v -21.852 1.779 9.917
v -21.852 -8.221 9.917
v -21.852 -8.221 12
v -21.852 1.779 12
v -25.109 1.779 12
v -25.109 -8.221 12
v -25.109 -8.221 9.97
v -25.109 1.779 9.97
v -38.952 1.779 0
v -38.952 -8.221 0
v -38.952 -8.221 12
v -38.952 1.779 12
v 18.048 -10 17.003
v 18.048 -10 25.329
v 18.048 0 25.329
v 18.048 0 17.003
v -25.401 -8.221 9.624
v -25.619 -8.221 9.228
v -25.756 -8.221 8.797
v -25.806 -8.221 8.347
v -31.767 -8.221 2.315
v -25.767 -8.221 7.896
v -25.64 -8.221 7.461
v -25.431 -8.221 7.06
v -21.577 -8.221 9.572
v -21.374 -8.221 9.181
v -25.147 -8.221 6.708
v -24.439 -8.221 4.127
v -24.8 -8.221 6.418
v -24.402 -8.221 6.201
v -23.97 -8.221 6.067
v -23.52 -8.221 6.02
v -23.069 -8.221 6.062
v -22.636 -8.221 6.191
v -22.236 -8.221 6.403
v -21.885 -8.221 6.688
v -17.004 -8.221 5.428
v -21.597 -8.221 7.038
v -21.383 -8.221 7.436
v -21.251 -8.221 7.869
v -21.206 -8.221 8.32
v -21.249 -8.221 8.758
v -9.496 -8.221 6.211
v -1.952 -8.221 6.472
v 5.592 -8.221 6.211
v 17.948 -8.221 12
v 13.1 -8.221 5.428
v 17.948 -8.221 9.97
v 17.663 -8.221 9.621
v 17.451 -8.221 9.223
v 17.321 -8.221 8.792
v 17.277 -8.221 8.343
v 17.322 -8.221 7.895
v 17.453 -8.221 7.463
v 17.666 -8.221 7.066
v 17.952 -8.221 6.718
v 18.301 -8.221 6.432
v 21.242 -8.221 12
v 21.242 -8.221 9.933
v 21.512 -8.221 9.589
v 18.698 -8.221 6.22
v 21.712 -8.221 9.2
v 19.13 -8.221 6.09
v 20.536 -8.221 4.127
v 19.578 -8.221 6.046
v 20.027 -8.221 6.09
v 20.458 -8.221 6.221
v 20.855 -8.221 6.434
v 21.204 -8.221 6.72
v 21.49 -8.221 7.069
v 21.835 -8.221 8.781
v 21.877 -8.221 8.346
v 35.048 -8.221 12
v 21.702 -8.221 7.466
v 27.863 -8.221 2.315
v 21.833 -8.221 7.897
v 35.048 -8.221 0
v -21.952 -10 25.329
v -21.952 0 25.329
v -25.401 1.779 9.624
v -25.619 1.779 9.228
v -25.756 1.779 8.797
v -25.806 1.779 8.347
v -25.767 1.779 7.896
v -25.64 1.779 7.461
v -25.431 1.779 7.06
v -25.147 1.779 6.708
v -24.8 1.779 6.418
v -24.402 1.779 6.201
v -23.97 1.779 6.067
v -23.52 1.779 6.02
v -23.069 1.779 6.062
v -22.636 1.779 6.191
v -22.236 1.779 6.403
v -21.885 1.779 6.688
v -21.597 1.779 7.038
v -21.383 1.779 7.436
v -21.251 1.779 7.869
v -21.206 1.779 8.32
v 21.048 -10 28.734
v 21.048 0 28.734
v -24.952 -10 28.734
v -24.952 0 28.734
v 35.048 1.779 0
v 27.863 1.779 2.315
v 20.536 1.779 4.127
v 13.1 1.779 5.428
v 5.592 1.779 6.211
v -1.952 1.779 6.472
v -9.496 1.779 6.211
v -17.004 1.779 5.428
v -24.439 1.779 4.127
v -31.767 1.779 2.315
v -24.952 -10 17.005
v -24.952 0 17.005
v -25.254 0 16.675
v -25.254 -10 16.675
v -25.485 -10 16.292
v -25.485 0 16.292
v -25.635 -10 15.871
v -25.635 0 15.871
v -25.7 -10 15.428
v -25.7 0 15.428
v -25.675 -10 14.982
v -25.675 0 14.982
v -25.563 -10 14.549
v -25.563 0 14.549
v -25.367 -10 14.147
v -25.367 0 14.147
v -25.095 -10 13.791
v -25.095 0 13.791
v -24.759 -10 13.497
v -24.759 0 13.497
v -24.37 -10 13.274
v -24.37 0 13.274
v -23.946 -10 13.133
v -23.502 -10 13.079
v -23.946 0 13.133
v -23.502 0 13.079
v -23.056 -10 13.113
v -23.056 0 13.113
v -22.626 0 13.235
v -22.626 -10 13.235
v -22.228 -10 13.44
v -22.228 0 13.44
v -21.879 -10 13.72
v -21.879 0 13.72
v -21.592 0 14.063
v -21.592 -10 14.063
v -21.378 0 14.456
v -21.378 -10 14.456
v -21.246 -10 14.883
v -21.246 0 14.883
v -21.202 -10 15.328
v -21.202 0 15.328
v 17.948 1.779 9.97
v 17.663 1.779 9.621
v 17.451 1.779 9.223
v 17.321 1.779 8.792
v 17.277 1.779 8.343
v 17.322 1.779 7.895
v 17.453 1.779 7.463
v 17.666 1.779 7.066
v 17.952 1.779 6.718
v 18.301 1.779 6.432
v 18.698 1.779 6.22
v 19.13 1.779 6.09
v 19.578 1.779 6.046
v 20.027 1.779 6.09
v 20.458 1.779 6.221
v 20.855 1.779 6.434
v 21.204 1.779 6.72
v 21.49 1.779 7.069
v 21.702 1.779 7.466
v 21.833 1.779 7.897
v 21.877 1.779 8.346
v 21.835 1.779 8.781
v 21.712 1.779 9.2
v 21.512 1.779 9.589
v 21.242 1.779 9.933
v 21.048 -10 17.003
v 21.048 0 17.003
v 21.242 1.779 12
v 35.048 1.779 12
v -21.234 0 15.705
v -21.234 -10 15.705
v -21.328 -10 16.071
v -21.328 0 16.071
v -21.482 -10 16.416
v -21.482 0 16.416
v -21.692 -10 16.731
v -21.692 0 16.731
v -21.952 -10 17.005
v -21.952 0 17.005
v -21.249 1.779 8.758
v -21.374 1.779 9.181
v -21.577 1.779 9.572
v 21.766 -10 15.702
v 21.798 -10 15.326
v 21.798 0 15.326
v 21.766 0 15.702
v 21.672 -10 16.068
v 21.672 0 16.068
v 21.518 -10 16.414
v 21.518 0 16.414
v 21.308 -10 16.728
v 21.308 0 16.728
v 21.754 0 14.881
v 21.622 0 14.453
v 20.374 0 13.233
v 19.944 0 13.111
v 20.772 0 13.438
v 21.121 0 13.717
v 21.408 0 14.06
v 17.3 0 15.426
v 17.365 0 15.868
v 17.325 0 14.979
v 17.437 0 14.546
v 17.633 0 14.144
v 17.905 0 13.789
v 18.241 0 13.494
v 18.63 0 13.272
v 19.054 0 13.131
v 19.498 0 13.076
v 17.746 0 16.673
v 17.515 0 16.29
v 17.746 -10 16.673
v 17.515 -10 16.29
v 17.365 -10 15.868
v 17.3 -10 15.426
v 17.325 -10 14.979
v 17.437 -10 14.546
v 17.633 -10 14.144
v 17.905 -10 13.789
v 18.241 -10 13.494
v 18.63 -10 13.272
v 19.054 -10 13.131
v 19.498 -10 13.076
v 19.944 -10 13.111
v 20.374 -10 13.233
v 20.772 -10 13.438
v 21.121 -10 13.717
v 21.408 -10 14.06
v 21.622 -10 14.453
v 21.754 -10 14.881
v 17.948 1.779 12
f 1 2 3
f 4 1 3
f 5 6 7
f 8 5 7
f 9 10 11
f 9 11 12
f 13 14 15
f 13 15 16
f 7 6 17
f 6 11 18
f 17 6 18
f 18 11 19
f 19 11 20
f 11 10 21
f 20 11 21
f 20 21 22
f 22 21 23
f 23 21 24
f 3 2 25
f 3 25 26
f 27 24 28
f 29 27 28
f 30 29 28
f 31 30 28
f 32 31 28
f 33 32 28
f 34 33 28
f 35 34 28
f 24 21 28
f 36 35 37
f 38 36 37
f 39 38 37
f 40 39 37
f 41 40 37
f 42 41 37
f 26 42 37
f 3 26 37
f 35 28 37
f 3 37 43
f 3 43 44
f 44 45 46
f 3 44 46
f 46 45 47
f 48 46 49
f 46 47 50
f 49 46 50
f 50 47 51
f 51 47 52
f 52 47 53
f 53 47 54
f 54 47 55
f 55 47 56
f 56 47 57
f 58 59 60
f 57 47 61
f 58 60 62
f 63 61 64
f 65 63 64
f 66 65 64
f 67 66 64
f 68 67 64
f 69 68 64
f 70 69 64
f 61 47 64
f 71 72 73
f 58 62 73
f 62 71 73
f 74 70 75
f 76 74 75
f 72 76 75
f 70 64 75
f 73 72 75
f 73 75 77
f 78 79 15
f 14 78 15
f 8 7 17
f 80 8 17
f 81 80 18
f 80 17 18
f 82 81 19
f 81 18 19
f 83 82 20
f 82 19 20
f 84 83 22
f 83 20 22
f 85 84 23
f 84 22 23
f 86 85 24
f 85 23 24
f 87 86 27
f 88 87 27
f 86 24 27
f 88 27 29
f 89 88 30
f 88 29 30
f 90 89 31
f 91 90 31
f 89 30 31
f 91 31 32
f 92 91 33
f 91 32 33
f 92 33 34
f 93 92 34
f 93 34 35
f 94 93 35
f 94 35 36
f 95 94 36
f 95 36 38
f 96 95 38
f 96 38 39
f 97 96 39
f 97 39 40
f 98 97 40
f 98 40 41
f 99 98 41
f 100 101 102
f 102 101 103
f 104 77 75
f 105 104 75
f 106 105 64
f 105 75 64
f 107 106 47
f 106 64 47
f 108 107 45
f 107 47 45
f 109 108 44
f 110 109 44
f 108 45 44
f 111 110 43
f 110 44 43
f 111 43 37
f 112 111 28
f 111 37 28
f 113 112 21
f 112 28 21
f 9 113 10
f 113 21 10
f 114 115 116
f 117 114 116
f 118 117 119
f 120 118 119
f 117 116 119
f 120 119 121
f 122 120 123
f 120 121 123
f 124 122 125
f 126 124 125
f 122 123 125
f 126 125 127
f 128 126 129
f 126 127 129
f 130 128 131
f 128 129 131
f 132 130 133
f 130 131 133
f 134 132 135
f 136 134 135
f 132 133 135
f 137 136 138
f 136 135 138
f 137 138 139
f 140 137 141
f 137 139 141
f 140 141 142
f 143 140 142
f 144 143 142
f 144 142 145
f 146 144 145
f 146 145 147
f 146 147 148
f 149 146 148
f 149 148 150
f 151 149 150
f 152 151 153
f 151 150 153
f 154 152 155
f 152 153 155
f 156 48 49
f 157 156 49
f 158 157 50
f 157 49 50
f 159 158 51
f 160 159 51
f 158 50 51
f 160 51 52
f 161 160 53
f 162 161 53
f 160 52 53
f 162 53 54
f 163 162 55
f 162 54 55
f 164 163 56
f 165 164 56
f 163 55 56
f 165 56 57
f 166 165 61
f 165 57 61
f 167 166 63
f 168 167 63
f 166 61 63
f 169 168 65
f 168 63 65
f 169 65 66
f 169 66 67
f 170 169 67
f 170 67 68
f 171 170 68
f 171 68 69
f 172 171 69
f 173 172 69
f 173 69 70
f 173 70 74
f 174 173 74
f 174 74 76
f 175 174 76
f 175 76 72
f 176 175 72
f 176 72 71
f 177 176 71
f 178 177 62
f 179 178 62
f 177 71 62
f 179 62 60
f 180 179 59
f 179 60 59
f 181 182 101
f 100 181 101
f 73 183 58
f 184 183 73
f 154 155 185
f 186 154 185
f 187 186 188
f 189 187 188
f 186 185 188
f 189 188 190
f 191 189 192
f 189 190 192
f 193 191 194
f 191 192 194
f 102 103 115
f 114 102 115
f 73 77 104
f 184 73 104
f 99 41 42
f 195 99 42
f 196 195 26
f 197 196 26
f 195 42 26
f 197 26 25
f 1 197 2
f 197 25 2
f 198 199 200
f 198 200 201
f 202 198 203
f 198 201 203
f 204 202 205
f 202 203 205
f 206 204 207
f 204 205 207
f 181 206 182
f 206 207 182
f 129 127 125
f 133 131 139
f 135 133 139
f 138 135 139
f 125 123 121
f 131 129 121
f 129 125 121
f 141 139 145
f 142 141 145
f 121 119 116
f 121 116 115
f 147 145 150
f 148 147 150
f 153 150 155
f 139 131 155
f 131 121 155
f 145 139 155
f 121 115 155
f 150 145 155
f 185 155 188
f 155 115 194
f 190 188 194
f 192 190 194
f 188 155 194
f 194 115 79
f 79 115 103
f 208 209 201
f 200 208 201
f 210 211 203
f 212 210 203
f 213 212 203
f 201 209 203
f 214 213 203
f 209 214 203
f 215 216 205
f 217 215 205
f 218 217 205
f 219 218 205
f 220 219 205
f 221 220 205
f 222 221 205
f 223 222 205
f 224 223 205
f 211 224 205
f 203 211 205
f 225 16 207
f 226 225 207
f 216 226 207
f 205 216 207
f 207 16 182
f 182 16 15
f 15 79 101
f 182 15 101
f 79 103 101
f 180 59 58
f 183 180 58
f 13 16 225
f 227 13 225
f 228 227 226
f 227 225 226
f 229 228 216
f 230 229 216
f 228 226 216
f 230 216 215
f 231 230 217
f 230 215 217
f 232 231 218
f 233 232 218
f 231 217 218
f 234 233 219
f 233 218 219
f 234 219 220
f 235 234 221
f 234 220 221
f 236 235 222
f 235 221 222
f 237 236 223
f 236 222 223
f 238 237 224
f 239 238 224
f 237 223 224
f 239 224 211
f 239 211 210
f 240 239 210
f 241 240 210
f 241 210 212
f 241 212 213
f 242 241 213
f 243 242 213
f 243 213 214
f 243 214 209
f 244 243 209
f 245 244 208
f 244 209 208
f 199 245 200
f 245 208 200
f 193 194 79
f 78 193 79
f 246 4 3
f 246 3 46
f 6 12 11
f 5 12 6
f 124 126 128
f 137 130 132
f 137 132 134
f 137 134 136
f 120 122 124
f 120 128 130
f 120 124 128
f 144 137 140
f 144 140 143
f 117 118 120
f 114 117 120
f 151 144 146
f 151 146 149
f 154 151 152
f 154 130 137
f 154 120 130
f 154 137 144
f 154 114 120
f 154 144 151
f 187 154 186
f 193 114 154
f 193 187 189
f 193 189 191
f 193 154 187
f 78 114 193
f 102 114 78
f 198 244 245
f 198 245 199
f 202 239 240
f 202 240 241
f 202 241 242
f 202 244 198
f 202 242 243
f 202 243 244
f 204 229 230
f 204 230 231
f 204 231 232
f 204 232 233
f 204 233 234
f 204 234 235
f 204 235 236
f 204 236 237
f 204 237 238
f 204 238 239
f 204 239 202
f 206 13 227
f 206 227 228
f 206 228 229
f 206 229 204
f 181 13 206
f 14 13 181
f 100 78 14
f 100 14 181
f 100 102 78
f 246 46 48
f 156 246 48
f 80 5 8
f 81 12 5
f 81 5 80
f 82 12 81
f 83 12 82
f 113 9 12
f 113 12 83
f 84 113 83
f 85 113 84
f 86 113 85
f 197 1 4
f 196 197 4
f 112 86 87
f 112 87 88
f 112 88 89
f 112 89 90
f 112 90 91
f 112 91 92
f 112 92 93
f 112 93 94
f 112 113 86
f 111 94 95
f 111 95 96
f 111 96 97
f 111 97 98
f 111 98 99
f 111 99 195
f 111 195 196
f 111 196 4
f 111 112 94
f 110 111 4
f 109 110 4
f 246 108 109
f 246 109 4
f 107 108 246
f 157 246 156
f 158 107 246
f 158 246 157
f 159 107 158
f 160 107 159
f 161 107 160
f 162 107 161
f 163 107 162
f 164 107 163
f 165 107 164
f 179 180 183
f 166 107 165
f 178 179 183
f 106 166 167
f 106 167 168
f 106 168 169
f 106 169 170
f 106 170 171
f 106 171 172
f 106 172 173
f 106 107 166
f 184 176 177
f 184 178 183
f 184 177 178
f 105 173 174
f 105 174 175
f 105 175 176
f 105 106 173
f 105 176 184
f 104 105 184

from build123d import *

# Parameters (mm, degrees)
F0_W     = 74
F0_H     = 10
F1_DEPTH = 12
F3_DEPTH = 10
F6_DEPTH = 10
F8_DEPTH = 12


with BuildPart() as f1:
    # F0 (on Top) → F1 (new body)
    with BuildSketch(Plane.XY):
        with Locations((-1.951925, -3.221154)):
            Rectangle(F0_W, F0_H)
    extrude(amount=F1_DEPTH)

    # F2 (on face) → F3 (cut)
    with BuildSketch(Plane.XZ.offset(8.221154)):
        with BuildLine():
            Line((-38.951925, 0), (35.048075, 0))
            ThreePointArc((35.048075, 0), (-1.951925, 6.471955), (-38.951925, 0))
        make_face()
    extrude(amount=-F3_DEPTH, mode=Mode.SUBTRACT)

    # F7 (on face) → F8 (cut)
    with BuildSketch(Plane.XZ.offset(8.221154)):
        with BuildLine():
            Line((21.242046, 9.932511), (21.242046, 12))
            Line((21.242046, 12), (17.948075, 12))
            Line((17.948075, 12), (17.948075, 9.96973))
            ThreePointArc((17.948075, 9.96973), (19.602909, 10.645744), (21.242046, 9.932511))
        make_face()
        with BuildLine():
            ThreePointArc((21.876923, 8.34589), (21.712313, 9.200354), (21.242046, 9.932511))
            ThreePointArc((21.242046, 9.932511), (19.602909, 10.645744), (17.948075, 9.96973))
            ThreePointArc((17.948075, 9.96973), (18.698387, 6.220291), (21.876923, 8.34589))
        make_face()
        with BuildLine():
            Line((-21.851925, 9.917387), (-21.851925, 12))
            Line((-21.851925, 12), (-25.108562, 12))
            Line((-25.108562, 12), (-25.108562, 9.96973))
            ThreePointArc((-25.108562, 9.96973), (-23.469382, 10.619312), (-21.851925, 9.917387))
        make_face()
        with BuildLine():
            ThreePointArc((-21.206345, 8.319609), (-21.373839, 9.181245), (-21.851925, 9.917387))
            ThreePointArc((-21.851925, 9.917387), (-23.469382, 10.619312), (-25.108562, 9.96973))
            ThreePointArc((-25.108562, 9.96973), (-24.402141, 6.201225), (-21.206345, 8.319609))
        make_face()
    extrude(amount=-F8_DEPTH, mode=Mode.SUBTRACT)


with BuildPart() as f6:
    # F5 (on Front) → F6 (new body)
    with BuildSketch(Plane.XZ):
        with BuildLine():
            ThreePointArc((-24.951925, 17.005337), (-23.451925, 17.578286), (-21.951925, 17.005337))
            Line((-21.951925, 17.005337), (-21.951925, 25.328802))
            Line((-21.951925, 25.328802), (18.048075, 25.328802))
            Line((18.048075, 25.328802), (18.048075, 17.002702))
            ThreePointArc((18.048075, 17.002702), (19.548076, 17.575649), (21.048075, 17.002698))
            Line((21.048075, 17.002698), (21.048075, 28.73421))
            Line((21.048075, 28.73421), (-24.951925, 28.73421))
            Line((-24.951925, 28.73421), (-24.951925, 17.005337))
        make_face()
        with BuildLine():
            ThreePointArc((-21.201925, 15.328286), (-21.397965, 16.246844), (-21.951925, 17.005337))
            ThreePointArc((-21.951925, 17.005337), (-23.451925, 17.578286), (-24.951925, 17.005337))
            ThreePointArc((-24.951925, 17.005337), (-24.370484, 13.274326), (-21.201925, 15.328286))
        make_face()
        with BuildLine():
            ThreePointArc((21.048075, 17.002698), (19.548076, 17.575649), (18.048075, 17.002702))
            ThreePointArc((18.048075, 17.002702), (18.629513, 13.27169), (21.798073, 15.325649))
            ThreePointArc((21.798073, 15.325649), (21.602033, 16.244206), (21.048075, 17.002698))
        make_face()
    extrude(amount=F6_DEPTH)


solid = Compound([f1.part, f6.part])
